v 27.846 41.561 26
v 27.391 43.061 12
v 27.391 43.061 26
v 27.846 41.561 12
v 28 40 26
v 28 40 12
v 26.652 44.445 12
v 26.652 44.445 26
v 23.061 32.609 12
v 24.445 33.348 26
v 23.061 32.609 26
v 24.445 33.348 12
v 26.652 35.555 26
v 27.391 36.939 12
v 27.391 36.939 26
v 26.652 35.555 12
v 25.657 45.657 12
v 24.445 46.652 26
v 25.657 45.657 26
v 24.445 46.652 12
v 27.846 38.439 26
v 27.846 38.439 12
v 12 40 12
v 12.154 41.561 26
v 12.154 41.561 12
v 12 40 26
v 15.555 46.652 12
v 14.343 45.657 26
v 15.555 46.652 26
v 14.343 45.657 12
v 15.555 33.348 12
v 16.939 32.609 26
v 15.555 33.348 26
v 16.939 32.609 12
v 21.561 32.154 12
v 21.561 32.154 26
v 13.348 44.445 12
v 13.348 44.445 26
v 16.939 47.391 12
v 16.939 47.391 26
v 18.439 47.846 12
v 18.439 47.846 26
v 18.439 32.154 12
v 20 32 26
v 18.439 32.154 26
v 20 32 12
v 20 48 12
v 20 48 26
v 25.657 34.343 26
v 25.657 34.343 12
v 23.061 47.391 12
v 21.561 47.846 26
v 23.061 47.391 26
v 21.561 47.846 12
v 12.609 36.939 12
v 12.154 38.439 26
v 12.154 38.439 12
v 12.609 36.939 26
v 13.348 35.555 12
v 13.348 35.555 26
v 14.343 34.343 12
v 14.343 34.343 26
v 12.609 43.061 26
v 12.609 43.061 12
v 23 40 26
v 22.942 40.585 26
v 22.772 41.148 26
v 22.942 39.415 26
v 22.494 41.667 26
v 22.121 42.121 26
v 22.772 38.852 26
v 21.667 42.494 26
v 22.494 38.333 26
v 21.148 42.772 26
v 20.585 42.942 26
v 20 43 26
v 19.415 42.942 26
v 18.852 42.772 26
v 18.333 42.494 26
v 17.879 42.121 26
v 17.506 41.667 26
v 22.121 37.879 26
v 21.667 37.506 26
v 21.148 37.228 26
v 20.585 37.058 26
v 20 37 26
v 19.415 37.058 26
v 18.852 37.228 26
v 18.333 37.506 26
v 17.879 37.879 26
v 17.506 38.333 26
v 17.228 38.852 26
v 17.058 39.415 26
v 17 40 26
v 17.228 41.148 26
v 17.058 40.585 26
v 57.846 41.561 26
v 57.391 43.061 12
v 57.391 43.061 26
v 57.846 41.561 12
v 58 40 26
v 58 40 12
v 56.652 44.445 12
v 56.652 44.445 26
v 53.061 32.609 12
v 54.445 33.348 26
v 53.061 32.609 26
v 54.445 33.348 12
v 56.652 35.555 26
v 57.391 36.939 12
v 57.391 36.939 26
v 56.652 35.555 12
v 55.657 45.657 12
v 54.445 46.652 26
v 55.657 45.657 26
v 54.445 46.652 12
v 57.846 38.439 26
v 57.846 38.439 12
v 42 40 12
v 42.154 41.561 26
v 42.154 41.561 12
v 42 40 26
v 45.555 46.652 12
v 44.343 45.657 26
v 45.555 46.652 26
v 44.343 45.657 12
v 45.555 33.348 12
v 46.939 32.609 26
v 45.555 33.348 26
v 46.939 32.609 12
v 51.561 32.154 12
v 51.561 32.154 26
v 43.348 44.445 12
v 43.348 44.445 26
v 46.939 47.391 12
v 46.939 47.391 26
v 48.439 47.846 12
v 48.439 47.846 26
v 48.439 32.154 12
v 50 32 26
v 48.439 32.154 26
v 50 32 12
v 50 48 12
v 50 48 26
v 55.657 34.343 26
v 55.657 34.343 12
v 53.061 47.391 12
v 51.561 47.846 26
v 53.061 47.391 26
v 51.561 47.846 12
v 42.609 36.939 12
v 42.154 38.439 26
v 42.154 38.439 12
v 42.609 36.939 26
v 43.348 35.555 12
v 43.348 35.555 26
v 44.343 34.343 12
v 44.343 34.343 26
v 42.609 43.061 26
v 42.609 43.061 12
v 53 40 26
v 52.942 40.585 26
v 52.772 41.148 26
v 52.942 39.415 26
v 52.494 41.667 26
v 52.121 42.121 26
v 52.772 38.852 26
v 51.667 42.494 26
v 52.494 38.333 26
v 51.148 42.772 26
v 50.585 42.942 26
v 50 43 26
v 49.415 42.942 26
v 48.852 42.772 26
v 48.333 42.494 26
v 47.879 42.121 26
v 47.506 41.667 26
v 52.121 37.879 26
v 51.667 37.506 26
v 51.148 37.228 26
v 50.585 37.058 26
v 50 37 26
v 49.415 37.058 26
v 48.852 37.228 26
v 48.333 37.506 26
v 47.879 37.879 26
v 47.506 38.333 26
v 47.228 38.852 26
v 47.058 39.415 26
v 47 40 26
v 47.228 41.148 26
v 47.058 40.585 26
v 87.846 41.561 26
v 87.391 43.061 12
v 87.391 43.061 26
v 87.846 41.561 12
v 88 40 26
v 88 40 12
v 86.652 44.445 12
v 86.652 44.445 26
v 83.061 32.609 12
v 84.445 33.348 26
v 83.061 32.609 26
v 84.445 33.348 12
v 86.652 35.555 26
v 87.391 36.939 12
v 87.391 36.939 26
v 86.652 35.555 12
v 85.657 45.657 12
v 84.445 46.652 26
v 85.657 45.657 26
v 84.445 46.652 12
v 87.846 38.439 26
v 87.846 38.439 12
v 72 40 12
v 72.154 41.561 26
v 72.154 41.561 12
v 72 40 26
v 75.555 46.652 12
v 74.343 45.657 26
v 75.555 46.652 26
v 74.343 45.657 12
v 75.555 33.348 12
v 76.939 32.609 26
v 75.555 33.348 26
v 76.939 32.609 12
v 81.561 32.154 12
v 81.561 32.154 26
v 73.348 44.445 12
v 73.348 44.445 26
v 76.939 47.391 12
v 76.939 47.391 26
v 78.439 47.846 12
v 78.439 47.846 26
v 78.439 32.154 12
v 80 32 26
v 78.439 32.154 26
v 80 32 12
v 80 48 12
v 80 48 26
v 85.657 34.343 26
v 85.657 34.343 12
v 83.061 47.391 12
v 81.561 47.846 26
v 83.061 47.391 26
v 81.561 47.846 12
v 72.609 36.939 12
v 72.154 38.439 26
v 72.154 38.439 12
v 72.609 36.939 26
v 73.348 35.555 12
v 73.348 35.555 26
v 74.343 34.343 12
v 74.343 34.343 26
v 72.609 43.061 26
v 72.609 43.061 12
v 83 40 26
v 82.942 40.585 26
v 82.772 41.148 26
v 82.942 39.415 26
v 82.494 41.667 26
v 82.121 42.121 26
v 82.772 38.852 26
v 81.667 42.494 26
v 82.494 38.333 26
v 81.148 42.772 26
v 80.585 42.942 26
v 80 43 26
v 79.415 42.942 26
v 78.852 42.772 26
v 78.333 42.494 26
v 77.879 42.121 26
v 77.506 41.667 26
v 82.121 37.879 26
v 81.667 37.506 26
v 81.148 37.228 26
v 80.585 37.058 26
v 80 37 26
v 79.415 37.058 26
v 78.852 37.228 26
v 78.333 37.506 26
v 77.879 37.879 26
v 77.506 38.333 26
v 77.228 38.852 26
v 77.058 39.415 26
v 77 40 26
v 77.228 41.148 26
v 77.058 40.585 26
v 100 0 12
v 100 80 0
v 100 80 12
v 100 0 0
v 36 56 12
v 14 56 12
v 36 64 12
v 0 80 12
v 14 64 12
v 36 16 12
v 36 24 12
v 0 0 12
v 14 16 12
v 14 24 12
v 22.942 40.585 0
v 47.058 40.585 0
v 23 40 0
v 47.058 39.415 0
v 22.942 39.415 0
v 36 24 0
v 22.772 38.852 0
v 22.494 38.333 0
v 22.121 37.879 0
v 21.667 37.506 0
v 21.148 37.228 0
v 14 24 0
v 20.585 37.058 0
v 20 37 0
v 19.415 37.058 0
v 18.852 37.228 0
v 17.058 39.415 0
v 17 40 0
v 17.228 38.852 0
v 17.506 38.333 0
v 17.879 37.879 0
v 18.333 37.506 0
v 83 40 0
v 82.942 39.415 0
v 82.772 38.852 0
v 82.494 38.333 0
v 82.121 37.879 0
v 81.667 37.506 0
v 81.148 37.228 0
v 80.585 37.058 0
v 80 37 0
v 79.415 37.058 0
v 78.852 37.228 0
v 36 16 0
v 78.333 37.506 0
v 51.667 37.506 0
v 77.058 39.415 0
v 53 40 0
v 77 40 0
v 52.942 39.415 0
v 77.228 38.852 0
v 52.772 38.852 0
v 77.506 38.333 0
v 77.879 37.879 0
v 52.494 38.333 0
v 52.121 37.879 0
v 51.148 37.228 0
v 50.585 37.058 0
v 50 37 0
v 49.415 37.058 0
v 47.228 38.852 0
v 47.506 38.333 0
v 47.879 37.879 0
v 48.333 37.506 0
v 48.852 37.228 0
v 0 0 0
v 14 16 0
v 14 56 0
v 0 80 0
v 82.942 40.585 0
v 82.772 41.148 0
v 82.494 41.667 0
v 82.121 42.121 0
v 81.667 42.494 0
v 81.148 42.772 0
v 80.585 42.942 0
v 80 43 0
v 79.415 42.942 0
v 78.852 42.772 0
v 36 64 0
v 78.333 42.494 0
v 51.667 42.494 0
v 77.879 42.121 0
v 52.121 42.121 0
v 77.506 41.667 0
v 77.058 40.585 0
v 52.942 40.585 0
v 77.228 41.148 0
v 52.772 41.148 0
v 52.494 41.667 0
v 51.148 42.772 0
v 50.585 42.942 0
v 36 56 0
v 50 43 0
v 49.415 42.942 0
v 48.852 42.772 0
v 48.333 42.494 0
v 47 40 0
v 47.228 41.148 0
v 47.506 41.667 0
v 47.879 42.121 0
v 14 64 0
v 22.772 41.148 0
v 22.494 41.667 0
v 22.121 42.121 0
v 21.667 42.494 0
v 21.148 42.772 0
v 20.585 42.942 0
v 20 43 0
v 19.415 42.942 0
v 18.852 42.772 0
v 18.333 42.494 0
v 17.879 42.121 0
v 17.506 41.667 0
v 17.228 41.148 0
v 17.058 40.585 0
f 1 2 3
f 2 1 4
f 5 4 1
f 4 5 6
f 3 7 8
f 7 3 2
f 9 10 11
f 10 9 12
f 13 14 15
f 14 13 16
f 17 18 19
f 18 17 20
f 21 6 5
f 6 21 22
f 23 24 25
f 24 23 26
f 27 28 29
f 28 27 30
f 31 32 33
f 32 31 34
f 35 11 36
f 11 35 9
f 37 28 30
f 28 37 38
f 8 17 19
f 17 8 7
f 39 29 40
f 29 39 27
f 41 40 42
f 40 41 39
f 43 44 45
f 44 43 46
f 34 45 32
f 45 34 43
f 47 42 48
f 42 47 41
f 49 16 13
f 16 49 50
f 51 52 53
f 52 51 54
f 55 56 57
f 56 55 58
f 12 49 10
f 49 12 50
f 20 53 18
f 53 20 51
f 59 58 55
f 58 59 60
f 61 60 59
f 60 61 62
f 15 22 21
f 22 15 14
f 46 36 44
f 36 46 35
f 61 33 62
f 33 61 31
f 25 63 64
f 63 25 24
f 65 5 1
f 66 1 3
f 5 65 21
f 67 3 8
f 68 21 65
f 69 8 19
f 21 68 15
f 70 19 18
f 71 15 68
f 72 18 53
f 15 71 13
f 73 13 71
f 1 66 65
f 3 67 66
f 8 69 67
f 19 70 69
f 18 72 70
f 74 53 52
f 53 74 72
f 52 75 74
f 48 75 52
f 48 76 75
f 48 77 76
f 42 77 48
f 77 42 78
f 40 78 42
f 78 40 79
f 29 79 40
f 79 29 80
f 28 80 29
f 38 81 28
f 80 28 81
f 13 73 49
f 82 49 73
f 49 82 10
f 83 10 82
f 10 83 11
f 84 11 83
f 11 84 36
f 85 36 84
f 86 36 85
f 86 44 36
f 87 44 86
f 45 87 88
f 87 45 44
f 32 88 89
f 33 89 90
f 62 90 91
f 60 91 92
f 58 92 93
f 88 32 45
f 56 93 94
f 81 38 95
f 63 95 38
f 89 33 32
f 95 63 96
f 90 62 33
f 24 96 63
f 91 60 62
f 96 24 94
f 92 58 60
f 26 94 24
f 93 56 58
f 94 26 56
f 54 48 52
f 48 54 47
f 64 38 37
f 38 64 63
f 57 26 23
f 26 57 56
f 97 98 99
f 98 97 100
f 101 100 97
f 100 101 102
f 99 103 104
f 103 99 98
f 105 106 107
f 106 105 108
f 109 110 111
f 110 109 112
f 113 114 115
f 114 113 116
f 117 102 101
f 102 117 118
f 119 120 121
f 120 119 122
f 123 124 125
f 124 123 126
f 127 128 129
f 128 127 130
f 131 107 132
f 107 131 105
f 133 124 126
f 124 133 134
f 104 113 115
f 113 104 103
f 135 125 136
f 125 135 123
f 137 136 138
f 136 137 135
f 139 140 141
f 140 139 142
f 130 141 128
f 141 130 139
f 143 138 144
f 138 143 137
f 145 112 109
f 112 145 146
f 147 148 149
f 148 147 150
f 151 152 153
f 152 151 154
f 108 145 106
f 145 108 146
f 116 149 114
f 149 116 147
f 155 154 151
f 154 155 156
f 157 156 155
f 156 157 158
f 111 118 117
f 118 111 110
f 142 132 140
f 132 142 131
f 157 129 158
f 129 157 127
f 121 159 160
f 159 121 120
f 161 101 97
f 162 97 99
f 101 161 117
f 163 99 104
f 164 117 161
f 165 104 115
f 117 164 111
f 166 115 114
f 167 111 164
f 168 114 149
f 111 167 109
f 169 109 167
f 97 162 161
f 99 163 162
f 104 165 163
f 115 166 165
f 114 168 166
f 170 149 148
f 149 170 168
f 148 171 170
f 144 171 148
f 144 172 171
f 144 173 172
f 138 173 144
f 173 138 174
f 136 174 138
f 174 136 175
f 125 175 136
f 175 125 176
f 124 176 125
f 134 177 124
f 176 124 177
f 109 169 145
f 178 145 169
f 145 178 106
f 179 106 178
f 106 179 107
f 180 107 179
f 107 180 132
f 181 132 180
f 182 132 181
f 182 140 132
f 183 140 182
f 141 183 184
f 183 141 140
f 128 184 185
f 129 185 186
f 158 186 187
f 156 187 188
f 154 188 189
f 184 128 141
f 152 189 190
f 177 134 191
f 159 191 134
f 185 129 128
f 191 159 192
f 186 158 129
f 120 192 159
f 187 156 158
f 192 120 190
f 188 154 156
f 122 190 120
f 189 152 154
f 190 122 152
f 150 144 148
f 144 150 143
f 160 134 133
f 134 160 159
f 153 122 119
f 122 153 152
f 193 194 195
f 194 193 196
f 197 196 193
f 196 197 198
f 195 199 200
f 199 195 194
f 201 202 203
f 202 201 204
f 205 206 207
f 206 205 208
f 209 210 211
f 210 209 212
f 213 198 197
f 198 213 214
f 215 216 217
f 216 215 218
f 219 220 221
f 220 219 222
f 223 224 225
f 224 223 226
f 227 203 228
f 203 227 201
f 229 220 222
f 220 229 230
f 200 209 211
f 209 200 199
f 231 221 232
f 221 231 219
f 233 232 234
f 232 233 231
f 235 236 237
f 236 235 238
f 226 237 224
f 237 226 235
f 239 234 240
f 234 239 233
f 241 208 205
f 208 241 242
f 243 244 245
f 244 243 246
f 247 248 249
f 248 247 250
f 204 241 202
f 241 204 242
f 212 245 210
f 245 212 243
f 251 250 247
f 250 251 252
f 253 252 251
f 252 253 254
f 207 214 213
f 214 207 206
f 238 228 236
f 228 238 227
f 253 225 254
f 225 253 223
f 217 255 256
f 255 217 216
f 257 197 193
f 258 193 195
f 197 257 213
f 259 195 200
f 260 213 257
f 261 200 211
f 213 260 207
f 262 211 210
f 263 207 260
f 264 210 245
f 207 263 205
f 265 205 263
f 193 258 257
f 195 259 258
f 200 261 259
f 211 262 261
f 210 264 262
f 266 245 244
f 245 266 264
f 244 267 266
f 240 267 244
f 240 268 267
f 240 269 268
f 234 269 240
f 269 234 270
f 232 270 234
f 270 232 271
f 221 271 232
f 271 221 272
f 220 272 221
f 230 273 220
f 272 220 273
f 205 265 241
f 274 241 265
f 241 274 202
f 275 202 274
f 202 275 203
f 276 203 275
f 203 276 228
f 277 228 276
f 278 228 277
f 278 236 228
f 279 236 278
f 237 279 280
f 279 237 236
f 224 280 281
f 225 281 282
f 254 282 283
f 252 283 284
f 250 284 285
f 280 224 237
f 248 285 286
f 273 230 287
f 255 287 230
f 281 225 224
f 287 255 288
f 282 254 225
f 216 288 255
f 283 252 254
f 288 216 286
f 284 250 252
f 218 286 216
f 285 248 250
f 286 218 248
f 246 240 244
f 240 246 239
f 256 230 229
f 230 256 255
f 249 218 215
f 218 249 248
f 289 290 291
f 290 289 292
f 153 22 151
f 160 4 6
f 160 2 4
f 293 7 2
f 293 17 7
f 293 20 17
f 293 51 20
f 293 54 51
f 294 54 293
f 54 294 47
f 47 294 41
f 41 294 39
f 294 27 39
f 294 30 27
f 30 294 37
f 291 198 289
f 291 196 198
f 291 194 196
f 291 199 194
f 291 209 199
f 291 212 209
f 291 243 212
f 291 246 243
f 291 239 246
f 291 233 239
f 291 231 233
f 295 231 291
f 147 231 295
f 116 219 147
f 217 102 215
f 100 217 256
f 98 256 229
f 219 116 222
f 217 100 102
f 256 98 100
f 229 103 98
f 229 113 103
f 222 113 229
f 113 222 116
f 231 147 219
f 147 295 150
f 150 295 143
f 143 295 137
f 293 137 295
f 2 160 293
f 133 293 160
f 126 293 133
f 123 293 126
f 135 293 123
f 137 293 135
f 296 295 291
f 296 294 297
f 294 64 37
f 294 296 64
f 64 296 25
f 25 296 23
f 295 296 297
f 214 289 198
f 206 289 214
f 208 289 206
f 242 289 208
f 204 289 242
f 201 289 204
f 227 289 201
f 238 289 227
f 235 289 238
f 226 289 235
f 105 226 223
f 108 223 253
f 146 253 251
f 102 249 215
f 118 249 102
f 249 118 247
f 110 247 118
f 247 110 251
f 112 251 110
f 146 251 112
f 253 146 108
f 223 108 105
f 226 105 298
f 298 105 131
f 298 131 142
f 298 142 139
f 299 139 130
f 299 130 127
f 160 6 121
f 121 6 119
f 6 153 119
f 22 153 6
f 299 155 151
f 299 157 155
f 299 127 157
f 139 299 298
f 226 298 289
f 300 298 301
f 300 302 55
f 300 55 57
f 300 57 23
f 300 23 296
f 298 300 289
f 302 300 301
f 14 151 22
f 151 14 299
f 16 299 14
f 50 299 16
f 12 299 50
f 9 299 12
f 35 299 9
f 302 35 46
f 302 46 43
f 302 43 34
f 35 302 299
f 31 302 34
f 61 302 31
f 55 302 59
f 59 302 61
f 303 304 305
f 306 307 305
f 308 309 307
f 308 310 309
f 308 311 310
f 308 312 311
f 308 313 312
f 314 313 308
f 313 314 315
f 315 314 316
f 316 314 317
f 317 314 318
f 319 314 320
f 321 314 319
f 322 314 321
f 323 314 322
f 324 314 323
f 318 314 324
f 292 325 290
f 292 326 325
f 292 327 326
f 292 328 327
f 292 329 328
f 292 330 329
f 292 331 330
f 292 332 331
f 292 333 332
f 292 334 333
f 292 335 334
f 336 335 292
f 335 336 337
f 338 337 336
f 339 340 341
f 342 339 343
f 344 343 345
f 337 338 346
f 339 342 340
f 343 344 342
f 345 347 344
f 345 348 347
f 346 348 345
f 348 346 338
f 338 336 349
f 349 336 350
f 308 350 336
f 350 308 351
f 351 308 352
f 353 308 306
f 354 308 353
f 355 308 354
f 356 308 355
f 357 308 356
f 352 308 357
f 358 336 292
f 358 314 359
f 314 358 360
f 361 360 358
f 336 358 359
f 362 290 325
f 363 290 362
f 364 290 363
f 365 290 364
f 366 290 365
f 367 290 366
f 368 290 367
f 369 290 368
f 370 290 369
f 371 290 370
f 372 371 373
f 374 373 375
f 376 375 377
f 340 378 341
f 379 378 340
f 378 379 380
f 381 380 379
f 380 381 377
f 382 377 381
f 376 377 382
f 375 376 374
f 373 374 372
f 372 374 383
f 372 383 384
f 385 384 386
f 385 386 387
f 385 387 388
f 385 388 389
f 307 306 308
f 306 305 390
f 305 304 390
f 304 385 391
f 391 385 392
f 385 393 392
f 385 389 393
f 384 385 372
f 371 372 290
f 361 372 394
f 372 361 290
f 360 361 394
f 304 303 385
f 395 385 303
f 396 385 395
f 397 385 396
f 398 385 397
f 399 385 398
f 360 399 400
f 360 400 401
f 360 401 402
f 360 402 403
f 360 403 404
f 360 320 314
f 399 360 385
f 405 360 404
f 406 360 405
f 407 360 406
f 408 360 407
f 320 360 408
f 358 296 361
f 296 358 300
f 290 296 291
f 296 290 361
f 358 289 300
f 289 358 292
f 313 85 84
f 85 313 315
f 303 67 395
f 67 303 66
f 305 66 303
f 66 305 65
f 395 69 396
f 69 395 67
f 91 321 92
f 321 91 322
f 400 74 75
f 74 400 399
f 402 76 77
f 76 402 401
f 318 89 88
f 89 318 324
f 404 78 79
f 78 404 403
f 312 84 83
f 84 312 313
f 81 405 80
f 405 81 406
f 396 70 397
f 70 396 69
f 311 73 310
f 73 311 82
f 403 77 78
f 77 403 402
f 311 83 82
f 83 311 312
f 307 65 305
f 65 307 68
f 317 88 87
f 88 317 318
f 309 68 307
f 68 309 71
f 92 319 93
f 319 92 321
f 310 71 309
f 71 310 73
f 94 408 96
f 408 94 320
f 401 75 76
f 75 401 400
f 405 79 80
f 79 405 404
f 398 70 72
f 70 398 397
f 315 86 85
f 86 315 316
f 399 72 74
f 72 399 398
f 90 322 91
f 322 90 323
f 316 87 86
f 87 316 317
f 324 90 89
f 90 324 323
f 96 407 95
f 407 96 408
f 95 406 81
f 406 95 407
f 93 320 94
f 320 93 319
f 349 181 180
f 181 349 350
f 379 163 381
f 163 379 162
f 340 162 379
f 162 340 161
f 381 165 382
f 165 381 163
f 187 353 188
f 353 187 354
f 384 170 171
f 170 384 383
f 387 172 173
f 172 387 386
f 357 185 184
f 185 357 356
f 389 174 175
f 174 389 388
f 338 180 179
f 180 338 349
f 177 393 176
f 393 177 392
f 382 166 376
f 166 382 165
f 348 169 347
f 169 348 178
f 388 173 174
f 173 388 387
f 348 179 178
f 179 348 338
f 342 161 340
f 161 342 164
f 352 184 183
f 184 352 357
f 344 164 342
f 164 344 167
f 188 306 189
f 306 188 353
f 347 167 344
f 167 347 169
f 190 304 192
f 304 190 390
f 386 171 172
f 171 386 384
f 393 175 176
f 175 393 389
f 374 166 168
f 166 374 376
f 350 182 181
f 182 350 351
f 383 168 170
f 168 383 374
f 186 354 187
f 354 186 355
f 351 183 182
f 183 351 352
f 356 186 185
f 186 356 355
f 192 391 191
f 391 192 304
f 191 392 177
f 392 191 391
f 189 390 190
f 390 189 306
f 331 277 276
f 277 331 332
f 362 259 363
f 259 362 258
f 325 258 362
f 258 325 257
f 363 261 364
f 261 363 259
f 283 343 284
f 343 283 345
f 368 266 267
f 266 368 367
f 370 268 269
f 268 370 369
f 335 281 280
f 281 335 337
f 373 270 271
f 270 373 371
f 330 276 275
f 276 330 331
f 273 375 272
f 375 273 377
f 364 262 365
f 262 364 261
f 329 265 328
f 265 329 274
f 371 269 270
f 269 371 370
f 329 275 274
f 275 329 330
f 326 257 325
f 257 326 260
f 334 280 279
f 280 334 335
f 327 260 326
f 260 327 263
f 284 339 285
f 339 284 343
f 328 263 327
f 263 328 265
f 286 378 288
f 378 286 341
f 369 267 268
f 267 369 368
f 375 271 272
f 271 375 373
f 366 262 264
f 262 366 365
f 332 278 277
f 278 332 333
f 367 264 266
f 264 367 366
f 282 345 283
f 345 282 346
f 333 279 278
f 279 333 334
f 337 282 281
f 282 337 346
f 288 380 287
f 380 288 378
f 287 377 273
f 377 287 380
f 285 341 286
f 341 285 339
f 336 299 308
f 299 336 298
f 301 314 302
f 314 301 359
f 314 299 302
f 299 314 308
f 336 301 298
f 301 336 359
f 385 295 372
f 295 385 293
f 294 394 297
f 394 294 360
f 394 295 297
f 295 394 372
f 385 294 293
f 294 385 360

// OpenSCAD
$fn = 32;

// ----------------------------------------------------------------------
// Drill jig: three_boss_slot jig
// ----------------------------------------------------------------------

// --- parameters (mm) ---
plate_l = 100;            // plate length, X
plate_w = 80;             // plate width, Y
plate_t = 12;             // plate thickness
boss_d = 16;              // guide boss diameter
boss_h = 15;              // boss height above the plate
guide_d = 6;              // guide hole diameter
boss_pitch = 30;          // boss pitch
slot_w = 8;               // clamp slot width
slot_l = 22;              // clamp slot length
slot_x = 14;              // slot start X
fit_tol = 0.1;            // tolerance for press fits, mm
free_tol = 0.3;           // tolerance for clearance fits, mm

n_boss = 3;  // guide bosses
boss_x0 = (plate_l - (n_boss - 1) * boss_pitch) / 2;  // first boss X
boss_top = plate_t - 1 + boss_h;  // boss crown height
total_h = boss_top;  // overall height

difference() {
  union() {
  cube([plate_l, plate_w, plate_t]);
  for (i = [0 : n_boss - 1])
    translate([boss_x0 + i * boss_pitch, plate_w / 2, plate_t - 1])
      cylinder(h = boss_h, d = boss_d);
  }
  for (i = [0 : n_boss - 1])
    translate([boss_x0 + i * boss_pitch, plate_w / 2, -1])
      cylinder(h = plate_t + boss_h, d = guide_d);
  for (cy = [plate_w * 0.25, plate_w * 0.75])
    translate([slot_x, cy - slot_w / 2, -1])
      cube([slot_l, slot_w, plate_t + 2]);
}
